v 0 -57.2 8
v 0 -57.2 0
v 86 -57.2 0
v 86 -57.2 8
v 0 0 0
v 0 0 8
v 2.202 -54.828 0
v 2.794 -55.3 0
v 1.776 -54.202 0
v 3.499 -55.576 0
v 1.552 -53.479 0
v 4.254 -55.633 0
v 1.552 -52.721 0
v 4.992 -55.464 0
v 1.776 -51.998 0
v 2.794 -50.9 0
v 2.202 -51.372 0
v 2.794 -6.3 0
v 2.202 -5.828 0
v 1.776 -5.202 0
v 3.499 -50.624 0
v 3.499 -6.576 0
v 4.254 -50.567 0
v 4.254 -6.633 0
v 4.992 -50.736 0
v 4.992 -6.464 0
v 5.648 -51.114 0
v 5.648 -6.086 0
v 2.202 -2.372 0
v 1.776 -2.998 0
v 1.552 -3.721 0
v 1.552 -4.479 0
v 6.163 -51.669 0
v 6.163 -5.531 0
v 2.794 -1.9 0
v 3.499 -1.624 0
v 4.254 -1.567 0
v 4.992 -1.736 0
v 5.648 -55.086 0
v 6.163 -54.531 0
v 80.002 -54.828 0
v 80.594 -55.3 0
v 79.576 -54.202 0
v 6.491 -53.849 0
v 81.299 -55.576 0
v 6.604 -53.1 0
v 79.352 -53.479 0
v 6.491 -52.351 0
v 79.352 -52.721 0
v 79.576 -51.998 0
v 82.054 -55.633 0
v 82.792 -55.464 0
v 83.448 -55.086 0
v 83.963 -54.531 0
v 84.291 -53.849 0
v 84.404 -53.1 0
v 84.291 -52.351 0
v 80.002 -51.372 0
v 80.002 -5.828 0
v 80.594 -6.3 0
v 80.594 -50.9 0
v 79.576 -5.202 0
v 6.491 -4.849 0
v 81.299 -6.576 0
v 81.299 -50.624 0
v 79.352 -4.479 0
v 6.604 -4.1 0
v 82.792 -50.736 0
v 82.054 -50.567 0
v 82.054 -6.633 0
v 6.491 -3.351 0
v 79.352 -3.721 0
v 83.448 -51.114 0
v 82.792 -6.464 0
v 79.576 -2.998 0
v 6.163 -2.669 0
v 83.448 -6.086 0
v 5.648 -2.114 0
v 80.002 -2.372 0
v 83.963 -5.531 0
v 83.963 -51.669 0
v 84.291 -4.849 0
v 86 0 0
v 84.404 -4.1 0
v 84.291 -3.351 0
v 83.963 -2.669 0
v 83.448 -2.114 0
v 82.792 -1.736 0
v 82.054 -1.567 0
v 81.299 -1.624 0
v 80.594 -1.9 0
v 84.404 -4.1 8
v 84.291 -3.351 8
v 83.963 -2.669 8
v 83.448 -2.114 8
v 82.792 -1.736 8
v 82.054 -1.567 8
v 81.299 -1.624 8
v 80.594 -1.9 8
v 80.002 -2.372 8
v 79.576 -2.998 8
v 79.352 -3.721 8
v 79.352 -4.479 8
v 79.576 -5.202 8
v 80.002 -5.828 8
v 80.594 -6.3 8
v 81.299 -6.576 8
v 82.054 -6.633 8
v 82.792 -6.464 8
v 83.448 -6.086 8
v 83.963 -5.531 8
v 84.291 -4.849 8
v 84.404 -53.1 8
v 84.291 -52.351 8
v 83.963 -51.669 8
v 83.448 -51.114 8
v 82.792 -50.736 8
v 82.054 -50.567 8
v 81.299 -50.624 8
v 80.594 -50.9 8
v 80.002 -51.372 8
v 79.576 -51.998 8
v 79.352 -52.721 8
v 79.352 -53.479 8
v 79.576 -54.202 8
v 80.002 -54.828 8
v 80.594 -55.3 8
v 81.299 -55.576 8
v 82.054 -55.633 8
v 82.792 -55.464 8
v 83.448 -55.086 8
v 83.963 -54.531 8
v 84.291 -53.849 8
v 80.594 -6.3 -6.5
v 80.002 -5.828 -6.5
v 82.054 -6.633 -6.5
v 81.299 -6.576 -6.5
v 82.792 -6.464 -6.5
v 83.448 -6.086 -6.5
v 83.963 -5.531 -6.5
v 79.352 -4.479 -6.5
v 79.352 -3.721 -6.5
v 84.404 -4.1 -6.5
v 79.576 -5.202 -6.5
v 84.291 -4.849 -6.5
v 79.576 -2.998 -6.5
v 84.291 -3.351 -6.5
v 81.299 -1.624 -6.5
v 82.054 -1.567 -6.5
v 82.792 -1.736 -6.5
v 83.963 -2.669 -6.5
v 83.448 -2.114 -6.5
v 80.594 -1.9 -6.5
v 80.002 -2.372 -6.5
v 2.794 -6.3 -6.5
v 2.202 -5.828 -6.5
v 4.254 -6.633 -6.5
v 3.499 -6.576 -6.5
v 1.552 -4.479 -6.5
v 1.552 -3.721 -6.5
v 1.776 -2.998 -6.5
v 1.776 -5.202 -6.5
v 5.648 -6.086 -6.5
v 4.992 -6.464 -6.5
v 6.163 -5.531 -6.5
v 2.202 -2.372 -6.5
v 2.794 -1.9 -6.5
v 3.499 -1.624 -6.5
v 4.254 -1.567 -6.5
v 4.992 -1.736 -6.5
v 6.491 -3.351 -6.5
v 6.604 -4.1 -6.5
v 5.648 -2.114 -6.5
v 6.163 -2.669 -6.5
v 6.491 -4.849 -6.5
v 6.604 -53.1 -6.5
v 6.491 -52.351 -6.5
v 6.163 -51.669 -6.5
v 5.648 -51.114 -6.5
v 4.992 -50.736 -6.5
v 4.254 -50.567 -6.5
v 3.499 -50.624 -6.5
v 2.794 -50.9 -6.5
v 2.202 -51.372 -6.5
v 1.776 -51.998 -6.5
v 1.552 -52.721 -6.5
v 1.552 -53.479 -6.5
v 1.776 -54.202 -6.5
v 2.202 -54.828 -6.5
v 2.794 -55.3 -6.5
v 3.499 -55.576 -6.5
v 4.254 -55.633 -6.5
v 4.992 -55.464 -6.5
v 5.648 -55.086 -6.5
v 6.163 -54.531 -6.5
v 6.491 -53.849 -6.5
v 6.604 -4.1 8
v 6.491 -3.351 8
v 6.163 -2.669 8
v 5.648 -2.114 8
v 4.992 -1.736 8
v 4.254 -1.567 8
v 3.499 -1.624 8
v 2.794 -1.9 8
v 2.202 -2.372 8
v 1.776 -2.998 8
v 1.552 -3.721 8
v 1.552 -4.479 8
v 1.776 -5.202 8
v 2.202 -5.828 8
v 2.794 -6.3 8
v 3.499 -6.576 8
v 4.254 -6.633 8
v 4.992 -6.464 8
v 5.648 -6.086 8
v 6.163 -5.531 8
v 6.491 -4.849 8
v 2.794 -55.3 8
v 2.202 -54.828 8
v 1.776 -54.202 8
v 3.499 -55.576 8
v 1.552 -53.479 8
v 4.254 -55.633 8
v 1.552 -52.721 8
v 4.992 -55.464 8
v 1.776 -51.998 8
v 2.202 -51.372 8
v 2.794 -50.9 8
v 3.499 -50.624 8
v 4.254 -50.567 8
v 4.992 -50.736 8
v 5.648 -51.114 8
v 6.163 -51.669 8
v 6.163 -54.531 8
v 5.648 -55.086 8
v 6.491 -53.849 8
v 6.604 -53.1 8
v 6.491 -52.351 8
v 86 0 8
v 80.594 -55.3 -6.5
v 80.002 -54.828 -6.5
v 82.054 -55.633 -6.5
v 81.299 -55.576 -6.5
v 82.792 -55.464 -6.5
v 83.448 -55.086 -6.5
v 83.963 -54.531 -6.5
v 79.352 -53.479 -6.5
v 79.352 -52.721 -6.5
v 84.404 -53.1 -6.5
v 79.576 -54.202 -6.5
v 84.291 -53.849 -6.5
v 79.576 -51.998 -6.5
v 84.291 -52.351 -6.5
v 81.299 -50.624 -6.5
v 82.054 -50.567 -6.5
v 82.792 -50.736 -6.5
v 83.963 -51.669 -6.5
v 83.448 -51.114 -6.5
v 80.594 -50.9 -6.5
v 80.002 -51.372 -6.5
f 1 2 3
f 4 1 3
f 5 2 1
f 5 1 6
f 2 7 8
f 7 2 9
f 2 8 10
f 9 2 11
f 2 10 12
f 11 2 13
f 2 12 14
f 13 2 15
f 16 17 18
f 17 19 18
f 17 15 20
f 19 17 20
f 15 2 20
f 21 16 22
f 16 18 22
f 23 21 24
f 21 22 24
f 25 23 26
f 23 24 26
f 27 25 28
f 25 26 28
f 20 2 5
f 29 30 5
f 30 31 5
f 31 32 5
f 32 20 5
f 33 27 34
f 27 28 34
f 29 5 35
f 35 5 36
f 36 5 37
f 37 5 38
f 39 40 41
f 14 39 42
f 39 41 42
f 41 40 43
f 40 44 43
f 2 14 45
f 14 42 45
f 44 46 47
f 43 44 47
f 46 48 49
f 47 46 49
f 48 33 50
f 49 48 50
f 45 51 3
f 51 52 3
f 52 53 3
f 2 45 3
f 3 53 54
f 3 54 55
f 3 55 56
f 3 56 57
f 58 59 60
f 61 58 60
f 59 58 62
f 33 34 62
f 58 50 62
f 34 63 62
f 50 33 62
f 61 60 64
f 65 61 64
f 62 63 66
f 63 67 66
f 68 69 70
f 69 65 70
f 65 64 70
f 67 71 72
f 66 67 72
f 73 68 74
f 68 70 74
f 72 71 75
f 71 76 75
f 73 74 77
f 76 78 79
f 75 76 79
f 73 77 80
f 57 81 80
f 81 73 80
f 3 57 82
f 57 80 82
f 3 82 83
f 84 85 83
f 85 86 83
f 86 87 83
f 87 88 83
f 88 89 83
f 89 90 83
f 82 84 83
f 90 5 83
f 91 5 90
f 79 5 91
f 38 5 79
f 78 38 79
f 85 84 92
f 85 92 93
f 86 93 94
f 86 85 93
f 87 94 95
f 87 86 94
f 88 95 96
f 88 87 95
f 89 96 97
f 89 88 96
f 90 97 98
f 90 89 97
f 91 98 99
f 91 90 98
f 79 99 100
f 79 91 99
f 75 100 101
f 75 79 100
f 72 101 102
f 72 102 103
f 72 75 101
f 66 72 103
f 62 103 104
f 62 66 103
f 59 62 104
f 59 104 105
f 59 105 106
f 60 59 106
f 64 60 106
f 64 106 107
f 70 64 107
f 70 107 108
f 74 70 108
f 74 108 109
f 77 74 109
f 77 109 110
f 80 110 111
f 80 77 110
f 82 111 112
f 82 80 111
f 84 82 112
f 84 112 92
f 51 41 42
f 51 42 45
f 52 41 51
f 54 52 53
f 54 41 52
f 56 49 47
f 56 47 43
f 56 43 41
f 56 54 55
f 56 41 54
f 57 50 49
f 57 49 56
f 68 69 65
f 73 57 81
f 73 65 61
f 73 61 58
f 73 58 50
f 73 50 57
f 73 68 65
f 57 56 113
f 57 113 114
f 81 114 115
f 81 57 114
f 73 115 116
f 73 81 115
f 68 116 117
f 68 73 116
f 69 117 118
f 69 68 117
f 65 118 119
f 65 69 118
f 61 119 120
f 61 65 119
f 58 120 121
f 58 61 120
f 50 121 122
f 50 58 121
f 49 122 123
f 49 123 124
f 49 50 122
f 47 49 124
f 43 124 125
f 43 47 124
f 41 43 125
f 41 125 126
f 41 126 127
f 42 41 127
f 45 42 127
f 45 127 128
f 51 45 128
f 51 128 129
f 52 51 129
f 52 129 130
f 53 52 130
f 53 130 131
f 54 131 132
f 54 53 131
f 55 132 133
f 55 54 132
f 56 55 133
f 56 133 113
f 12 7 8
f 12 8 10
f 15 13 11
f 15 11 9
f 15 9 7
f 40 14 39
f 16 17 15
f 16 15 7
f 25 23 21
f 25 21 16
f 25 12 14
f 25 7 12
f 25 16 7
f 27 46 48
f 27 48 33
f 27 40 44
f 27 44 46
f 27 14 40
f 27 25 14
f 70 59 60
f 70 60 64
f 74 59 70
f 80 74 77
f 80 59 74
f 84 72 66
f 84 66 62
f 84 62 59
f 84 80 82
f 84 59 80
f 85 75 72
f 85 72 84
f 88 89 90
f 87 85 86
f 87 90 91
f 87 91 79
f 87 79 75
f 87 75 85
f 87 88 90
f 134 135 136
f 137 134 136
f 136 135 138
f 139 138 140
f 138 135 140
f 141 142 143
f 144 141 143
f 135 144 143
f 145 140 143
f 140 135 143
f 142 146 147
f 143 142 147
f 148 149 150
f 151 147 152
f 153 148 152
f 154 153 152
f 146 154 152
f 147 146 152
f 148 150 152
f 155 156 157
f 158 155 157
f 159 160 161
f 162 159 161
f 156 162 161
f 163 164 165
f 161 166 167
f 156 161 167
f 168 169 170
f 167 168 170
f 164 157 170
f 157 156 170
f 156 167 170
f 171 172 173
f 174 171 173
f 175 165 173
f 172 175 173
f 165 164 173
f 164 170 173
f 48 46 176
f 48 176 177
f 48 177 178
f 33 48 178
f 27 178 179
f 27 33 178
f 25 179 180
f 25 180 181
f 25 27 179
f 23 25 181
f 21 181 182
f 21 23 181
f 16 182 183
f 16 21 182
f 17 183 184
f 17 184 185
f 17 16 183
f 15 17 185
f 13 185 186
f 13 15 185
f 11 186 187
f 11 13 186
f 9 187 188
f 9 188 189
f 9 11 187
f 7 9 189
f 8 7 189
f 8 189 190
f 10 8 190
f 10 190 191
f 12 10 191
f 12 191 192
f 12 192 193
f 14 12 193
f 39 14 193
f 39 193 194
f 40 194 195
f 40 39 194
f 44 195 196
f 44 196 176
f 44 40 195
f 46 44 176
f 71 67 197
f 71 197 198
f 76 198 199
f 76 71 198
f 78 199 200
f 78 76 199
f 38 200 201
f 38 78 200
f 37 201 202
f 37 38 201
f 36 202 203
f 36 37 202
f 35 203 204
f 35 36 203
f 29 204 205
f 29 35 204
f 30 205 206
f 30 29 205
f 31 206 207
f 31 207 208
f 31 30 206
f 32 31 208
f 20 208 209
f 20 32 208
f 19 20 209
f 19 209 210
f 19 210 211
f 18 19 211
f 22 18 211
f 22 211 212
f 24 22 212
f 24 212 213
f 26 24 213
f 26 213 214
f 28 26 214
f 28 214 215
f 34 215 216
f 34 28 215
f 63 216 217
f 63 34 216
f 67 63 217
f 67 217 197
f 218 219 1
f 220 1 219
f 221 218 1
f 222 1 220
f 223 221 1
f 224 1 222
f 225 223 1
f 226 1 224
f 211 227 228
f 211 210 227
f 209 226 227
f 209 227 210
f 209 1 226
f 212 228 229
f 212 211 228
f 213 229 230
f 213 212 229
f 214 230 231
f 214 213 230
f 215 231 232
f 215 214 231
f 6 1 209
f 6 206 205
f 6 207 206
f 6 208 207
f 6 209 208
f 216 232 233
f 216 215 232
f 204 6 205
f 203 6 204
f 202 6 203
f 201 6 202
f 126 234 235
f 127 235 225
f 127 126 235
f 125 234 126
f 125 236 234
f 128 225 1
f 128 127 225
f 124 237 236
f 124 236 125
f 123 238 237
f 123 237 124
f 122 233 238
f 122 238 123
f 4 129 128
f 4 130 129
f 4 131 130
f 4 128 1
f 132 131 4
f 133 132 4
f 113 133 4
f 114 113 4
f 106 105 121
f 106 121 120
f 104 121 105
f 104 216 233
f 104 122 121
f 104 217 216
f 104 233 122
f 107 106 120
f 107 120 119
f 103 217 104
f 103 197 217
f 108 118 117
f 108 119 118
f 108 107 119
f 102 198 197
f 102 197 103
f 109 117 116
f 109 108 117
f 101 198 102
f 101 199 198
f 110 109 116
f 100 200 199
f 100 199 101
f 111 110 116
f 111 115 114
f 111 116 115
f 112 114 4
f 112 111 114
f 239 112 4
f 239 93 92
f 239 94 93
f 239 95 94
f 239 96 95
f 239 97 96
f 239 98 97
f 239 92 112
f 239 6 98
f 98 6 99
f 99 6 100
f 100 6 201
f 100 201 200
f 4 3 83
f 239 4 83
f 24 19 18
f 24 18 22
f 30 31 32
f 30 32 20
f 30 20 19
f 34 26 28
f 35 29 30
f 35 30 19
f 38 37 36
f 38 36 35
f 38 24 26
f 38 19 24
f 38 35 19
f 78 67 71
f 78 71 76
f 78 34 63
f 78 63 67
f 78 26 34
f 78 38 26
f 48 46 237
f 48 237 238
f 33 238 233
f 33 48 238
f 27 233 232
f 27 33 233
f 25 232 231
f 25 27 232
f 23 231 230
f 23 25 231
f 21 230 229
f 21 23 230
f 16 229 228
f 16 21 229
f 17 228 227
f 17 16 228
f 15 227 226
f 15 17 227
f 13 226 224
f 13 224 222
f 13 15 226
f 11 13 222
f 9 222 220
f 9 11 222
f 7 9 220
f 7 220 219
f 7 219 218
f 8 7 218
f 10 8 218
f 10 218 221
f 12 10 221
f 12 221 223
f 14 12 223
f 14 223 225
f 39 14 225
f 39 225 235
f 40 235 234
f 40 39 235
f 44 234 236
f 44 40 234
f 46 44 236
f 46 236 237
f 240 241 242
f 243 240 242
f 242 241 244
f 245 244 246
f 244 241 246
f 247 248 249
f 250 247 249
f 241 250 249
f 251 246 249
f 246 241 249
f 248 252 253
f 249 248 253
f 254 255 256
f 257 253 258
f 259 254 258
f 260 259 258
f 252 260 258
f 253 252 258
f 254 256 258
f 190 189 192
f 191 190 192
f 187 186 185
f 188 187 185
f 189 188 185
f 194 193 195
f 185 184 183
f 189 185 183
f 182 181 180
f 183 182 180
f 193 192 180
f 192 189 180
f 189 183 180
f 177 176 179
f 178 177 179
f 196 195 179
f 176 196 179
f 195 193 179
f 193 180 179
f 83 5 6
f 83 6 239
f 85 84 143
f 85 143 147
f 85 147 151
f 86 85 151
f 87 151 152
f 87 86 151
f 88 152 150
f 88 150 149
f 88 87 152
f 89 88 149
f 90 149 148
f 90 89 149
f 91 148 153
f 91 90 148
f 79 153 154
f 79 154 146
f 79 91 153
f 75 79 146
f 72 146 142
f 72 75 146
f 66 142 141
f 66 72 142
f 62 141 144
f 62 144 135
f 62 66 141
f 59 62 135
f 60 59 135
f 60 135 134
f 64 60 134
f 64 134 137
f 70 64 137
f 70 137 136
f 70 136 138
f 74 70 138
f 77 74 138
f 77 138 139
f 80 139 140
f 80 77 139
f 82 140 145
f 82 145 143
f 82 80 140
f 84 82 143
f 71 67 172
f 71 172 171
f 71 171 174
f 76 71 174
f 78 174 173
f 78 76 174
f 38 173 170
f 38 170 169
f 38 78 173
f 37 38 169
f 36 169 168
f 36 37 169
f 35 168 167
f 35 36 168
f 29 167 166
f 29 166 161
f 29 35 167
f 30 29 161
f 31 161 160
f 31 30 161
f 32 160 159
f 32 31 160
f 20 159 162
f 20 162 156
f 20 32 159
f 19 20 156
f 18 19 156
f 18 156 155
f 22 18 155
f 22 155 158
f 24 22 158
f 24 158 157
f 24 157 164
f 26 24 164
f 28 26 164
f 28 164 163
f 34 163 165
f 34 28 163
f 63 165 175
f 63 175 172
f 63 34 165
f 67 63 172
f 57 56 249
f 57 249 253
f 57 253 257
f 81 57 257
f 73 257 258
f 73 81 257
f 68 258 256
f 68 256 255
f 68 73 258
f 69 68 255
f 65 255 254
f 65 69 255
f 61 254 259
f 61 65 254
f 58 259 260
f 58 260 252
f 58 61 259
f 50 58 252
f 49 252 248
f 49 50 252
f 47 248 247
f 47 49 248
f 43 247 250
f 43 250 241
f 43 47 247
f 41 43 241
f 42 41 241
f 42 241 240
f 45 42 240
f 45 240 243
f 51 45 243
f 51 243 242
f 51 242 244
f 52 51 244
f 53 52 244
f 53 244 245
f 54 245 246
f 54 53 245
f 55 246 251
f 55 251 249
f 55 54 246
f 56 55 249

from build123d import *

# Parameters (mm, degrees)
SKETCH1_W             = 86
SKETCH1_H             = 57.2
SKETCH1_R             = 2.54
BOSS_EXTRUDE1_DEPTH   = 8
SKETCH1_2_R           = 2.54
BOSS_EXTRUDE2_DEPTH   = 6.5
BOSS_EXTRUDE2_2_DEPTH = 6.5
BOSS_EXTRUDE2_3_DEPTH = 6.5
BOSS_EXTRUDE2_4_DEPTH = 6.5


with BuildPart() as part:
    # Sketch1 → Boss-Extrude1 (new body)
    with BuildSketch(Plane.XY):
        with Locations((43, -28.6)):
            Rectangle(SKETCH1_W, SKETCH1_H)
        with Locations((4.064, -4.1)):
            Circle(SKETCH1_R, mode=Mode.SUBTRACT)
        with Locations((81.864, -4.1)):
            Circle(SKETCH1_R, mode=Mode.SUBTRACT)
        with Locations((81.864, -53.1)):
            Circle(SKETCH1_R, mode=Mode.SUBTRACT)
        with Locations((4.064, -53.1)):
            Circle(SKETCH1_R, mode=Mode.SUBTRACT)
    extrude(amount=BOSS_EXTRUDE1_DEPTH)


with BuildPart() as body_2:
    # Sketch1<2> → Boss-Extrude2 (new body)
    with BuildSketch(Plane.XY):
        with Locations((4.064, -4.1)):
            Circle(SKETCH1_2_R)
    extrude(amount=-BOSS_EXTRUDE2_DEPTH)


with BuildPart() as body_3:
    # Sketch1<2> → Boss-Extrude2 2 (new body)
    with BuildSketch(Plane.XY):
        with Locations((81.864, -4.1)):
            Circle(SKETCH1_2_R)
    extrude(amount=-BOSS_EXTRUDE2_2_DEPTH)


with BuildPart() as body_4:
    # Sketch1<2> → Boss-Extrude2 3 (new body)
    with BuildSketch(Plane.XY):
        with Locations((81.864, -53.1)):
            Circle(SKETCH1_2_R)
    extrude(amount=-BOSS_EXTRUDE2_3_DEPTH)


with BuildPart() as body_5:
    # Sketch1<2> → Boss-Extrude2 4 (new body)
    with BuildSketch(Plane.XY):
        with Locations((4.064, -53.1)):
            Circle(SKETCH1_2_R)
    extrude(amount=-BOSS_EXTRUDE2_4_DEPTH)


solid = Compound([part.part, body_2.part, body_3.part, body_4.part, body_5.part])
